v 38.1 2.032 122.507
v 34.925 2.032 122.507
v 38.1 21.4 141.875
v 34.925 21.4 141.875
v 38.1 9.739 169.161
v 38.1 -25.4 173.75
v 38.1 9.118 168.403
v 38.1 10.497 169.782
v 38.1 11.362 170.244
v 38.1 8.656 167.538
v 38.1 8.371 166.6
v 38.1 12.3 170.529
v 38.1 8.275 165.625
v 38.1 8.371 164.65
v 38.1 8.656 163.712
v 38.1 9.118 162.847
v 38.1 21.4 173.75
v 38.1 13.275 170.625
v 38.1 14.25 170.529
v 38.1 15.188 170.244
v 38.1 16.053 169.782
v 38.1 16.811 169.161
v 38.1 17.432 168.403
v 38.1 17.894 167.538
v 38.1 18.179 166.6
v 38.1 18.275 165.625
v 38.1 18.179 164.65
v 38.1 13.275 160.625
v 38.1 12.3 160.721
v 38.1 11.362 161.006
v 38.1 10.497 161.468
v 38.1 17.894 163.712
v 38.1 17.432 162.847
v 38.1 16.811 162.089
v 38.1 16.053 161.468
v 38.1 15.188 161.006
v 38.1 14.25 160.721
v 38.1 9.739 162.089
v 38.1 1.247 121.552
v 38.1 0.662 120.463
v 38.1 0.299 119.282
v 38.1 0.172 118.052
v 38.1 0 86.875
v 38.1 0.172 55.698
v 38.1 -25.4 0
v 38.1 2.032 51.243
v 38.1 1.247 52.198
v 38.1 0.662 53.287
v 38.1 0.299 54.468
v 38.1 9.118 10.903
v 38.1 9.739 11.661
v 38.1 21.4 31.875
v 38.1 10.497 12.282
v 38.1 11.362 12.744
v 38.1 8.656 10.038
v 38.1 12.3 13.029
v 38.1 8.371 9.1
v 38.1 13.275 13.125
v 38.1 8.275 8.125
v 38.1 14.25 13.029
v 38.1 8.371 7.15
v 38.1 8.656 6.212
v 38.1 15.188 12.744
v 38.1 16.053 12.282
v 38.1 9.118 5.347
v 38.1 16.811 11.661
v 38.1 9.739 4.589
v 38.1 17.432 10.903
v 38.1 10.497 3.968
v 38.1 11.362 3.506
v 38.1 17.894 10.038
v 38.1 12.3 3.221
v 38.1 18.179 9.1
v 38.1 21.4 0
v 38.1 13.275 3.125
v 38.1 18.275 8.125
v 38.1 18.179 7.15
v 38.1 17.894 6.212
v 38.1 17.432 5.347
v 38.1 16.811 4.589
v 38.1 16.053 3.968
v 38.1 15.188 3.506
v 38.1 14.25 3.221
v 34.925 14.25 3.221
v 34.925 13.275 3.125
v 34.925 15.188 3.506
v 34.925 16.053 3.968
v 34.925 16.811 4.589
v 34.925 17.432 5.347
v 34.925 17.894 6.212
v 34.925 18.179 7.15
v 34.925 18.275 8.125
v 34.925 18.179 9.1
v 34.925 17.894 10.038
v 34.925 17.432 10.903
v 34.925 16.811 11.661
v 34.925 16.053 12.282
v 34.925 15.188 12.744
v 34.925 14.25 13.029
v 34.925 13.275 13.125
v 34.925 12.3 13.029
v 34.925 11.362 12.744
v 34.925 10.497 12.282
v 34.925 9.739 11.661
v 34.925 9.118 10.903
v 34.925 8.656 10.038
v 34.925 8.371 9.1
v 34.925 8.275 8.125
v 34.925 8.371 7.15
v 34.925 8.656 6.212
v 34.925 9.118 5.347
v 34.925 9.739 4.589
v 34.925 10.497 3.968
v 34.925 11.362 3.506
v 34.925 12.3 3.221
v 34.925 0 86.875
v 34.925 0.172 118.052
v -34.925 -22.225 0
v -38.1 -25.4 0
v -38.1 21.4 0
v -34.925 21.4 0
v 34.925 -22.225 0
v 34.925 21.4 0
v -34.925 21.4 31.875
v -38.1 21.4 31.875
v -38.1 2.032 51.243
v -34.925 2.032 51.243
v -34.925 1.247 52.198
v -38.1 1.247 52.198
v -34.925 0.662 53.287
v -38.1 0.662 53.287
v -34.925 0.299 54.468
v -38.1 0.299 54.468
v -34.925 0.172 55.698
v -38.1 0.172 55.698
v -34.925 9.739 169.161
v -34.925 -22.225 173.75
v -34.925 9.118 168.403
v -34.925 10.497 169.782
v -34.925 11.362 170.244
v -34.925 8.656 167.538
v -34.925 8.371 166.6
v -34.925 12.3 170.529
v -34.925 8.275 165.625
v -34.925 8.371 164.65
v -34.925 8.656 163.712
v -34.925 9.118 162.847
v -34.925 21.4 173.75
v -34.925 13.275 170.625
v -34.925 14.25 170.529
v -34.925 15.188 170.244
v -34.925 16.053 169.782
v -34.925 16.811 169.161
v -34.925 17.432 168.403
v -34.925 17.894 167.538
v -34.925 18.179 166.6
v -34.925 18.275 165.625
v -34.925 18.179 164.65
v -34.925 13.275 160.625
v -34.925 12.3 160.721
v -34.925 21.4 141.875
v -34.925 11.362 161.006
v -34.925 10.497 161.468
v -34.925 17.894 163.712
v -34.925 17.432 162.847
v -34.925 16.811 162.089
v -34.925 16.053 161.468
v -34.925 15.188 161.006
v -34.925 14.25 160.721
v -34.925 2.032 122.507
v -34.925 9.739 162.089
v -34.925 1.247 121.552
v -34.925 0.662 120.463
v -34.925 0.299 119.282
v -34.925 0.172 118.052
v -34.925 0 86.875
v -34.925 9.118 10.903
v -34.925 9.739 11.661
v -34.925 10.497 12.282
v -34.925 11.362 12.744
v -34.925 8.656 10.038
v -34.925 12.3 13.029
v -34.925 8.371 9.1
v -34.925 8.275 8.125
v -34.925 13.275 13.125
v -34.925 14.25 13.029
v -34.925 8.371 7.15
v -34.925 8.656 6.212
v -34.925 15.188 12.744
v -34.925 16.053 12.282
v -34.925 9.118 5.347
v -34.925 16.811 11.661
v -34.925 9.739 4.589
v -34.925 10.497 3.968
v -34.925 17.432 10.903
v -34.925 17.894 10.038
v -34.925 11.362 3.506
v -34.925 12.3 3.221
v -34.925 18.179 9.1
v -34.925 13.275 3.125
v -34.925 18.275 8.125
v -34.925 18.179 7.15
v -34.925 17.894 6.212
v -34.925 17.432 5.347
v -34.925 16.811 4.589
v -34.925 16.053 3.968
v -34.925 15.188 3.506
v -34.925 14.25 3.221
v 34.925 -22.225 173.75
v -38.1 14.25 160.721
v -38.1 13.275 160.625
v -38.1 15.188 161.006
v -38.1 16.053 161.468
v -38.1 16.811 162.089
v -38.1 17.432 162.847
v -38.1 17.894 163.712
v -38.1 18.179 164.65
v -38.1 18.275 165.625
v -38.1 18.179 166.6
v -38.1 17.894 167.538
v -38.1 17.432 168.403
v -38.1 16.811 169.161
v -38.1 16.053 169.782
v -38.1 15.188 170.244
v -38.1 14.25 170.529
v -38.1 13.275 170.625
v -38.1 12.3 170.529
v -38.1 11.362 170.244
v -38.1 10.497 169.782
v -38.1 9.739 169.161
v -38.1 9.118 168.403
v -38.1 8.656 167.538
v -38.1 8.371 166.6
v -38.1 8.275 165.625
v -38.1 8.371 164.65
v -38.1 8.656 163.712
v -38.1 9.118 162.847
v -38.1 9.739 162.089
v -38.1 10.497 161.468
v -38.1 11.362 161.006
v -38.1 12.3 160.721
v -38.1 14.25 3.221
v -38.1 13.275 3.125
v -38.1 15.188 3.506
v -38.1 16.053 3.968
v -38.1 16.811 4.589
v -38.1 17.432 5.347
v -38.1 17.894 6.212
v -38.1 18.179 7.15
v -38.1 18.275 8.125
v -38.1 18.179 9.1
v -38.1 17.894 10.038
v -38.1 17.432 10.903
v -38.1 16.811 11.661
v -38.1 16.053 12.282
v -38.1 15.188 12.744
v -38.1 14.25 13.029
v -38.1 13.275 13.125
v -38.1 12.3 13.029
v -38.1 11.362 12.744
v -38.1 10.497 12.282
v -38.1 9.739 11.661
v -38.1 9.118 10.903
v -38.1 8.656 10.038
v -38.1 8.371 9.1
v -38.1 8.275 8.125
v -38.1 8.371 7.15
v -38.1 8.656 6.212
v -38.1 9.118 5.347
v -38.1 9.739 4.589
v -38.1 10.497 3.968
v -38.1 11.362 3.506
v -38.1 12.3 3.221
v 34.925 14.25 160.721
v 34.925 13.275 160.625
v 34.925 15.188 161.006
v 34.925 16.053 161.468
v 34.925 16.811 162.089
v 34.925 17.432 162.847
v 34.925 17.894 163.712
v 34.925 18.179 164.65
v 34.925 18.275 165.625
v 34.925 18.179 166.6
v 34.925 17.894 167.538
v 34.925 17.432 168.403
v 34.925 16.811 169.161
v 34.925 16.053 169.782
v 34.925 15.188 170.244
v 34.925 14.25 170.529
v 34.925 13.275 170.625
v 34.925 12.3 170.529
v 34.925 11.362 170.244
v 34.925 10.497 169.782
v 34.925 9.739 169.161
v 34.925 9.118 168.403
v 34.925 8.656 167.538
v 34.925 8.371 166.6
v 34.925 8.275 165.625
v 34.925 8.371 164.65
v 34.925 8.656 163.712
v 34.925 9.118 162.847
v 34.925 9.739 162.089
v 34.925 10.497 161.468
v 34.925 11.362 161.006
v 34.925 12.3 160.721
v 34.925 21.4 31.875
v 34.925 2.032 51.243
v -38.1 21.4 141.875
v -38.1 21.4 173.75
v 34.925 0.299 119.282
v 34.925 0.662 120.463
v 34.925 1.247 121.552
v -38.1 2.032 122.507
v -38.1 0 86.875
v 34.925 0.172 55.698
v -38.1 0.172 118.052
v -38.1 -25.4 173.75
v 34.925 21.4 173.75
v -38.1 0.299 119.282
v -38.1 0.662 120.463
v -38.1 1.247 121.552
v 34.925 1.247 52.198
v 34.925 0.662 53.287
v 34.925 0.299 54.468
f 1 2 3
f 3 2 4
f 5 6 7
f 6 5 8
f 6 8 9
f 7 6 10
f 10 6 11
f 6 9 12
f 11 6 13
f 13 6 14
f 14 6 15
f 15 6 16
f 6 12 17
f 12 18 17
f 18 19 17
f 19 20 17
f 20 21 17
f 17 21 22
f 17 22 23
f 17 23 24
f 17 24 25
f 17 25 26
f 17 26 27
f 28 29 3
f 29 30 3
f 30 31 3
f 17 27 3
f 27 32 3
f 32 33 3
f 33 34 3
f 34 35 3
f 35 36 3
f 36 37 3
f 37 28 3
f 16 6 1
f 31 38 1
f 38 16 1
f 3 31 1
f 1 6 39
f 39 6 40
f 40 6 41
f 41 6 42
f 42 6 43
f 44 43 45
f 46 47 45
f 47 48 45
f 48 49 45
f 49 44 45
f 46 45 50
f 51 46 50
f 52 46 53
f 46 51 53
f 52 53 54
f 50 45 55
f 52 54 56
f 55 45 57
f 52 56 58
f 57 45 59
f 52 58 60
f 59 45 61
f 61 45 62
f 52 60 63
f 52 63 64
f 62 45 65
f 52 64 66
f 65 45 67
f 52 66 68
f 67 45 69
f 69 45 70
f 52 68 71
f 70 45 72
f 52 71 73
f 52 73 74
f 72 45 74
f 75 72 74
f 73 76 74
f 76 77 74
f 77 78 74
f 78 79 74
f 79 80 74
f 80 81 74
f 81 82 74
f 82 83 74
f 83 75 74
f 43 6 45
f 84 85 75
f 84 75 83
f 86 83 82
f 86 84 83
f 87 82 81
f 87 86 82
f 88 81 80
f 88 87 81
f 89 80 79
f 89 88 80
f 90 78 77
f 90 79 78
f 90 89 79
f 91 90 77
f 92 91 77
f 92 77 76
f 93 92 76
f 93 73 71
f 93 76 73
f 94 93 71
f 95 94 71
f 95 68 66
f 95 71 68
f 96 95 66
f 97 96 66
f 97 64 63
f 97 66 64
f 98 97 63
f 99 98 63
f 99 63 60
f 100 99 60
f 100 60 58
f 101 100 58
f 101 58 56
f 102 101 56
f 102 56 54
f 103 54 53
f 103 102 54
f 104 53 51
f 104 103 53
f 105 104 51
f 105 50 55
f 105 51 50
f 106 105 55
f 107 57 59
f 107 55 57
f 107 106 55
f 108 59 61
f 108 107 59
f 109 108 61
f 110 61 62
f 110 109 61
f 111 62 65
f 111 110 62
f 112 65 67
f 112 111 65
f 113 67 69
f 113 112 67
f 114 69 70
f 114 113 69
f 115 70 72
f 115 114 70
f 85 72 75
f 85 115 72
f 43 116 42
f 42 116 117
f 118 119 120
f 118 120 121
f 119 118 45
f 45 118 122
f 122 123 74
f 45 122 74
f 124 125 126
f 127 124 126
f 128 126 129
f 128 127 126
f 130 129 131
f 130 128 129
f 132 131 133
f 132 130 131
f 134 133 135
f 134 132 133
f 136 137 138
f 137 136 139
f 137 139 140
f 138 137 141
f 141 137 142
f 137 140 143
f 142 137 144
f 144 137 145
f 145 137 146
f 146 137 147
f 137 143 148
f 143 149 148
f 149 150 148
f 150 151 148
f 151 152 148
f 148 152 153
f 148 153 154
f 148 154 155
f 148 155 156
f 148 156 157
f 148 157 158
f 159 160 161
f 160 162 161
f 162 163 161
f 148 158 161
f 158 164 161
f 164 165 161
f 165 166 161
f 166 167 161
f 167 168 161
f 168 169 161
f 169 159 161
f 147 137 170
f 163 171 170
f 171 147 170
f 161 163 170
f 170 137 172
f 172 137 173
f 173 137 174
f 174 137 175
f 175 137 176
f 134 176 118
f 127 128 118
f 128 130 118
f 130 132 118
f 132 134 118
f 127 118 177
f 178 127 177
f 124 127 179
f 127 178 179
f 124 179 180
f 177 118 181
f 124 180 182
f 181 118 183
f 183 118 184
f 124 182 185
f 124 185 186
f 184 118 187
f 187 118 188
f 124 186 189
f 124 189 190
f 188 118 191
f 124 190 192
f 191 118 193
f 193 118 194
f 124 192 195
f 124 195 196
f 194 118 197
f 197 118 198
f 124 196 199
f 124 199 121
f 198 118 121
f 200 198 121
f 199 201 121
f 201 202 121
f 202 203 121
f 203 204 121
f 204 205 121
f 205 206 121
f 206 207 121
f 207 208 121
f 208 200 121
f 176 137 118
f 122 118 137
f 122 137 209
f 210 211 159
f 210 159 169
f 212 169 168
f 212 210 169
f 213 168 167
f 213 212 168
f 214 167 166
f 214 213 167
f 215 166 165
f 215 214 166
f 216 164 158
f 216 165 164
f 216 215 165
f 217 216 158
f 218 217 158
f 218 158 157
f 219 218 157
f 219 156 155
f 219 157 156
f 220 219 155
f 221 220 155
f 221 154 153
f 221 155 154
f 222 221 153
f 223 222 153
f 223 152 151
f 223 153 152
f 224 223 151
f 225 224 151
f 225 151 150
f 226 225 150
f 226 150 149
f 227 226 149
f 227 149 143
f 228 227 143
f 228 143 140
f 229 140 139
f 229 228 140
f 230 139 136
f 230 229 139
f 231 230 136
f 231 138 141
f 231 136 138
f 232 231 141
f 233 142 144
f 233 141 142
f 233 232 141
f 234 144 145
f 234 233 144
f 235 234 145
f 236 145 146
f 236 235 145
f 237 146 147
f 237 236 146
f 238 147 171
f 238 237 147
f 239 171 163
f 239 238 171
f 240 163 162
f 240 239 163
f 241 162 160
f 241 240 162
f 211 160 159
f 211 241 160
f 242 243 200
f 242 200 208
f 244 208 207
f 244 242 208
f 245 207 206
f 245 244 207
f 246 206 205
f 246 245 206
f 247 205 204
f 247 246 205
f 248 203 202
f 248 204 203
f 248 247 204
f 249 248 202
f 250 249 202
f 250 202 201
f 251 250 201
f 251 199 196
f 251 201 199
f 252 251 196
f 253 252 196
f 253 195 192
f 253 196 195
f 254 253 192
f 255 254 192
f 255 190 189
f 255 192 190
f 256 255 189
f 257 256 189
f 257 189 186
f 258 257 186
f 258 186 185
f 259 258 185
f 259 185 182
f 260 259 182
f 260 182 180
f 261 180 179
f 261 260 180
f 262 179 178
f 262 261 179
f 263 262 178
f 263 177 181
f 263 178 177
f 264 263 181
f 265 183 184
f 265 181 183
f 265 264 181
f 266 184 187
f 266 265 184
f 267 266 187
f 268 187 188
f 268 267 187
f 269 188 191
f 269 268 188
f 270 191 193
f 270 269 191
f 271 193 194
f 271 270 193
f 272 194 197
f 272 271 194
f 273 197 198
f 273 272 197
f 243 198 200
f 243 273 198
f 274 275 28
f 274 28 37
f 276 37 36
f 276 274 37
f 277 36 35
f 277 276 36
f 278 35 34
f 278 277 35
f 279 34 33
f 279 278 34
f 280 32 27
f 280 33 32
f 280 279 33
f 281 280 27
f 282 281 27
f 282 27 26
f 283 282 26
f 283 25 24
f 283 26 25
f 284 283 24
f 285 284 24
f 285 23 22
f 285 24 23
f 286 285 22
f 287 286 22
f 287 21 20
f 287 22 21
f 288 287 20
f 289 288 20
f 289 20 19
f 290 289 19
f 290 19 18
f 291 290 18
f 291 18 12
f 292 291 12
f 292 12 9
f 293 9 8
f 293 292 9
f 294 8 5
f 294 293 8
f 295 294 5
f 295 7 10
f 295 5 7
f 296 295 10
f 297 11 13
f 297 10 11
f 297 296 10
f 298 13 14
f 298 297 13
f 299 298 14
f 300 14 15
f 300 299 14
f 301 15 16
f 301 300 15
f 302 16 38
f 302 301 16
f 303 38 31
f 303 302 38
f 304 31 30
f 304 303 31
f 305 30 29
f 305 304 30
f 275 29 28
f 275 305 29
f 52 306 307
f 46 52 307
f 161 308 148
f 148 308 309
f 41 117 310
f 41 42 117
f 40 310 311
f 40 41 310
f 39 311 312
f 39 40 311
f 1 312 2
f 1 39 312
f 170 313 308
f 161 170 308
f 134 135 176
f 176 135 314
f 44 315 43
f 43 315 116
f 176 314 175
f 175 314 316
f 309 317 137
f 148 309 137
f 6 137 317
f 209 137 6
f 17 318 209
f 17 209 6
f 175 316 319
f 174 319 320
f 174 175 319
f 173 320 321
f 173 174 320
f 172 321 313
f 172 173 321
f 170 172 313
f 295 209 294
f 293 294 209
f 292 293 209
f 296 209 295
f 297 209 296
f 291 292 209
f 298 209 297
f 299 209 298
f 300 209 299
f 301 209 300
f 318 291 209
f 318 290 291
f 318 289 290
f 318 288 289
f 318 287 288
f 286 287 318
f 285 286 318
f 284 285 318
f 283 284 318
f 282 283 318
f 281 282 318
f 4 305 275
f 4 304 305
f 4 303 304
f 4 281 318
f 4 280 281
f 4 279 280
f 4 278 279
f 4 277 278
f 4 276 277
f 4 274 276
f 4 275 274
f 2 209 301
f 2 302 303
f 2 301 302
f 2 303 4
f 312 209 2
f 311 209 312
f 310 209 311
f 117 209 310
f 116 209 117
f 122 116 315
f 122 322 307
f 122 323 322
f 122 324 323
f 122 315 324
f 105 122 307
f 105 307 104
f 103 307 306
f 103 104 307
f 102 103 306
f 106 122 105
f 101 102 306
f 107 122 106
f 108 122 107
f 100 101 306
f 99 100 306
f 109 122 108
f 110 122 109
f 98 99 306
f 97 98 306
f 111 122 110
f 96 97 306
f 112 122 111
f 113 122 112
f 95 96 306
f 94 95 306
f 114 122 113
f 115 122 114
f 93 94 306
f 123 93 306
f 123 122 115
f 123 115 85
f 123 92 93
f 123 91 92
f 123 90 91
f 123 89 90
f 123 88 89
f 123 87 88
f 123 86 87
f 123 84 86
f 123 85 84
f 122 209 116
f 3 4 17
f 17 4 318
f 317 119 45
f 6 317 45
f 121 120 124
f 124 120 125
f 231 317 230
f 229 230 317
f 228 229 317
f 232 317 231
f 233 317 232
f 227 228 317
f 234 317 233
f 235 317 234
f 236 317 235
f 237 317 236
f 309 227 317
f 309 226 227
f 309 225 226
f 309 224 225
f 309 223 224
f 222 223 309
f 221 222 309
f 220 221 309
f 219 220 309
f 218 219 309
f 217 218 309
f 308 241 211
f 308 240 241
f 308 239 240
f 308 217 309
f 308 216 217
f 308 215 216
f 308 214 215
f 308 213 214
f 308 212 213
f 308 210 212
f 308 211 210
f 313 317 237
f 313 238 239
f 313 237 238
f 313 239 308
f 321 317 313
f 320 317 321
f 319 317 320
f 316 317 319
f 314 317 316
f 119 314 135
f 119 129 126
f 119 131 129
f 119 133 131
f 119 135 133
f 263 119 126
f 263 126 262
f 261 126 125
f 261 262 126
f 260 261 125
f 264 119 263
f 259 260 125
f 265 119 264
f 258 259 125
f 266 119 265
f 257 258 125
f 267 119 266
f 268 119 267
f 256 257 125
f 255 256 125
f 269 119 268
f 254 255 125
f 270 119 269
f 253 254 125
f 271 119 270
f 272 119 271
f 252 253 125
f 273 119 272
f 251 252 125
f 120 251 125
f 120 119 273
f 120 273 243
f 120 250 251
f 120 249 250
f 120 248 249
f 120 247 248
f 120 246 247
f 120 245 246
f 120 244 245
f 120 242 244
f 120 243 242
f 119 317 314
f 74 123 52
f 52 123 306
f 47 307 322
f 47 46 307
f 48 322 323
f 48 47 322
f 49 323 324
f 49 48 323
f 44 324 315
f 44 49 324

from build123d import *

# Parameters (mm, degrees)
SKETCH1_W               = 76.2
SKETCH1_H               = 50.8
SKETCH1_W_2             = 69.85
SKETCH1_H_2             = 44.45
BOSS_EXTRUDE1_DEPTH     = 173.75
CUT_EXTRUDE1_DEPTH      = 180.682588194
CUT_EXTRUDE1_DEPTH_BACK = 180.682588194
SKETCH2_R               = 5
FILLET1_R               = 6.35


with BuildPart() as part:
    # Sketch1 → Boss-Extrude1 (new body)
    with BuildSketch(Plane.XY):
        Rectangle(SKETCH1_W, SKETCH1_H)
        Rectangle(SKETCH1_W_2, SKETCH1_H_2, mode=Mode.SUBTRACT)
    extrude(amount=BOSS_EXTRUDE1_DEPTH)

    # Sketch2 → Cut-Extrude1 (cut, two sides: drawn at the far end of the back side and taken through both)
    with BuildSketch(Plane(origin=(0, 0, 0), x_dir=(0, 0, -1), z_dir=(1, 0, 0)).offset(-CUT_EXTRUDE1_DEPTH_BACK)):
        with Locations((-165.625, 13.275)):
            Circle(SKETCH2_R)
        with Locations((-8.125, 13.275)):
            Circle(SKETCH2_R)
        Polygon((-173.75, 25.4), (0, 25.4), (0, 21.4), (-31.875, 21.4), (-53.088203436, 0.186796564), (-86.875, 0), (-120.661796564, 0.186796564), (-141.875, 21.4), (-173.75, 21.4), align=None)
    extrude(amount=CUT_EXTRUDE1_DEPTH + CUT_EXTRUDE1_DEPTH_BACK, mode=Mode.SUBTRACT)

    # Fillet1
    fillet1_edges = [part.edges().sort_by_distance(p)[0] for p in [
        (-36.5125, 0.186796564, 53.088203436),
        (-36.5125, 0.186796564, 120.661796564),
        (36.5125, 0.186796564, 53.088203436),
        (36.5125, 0.186796564, 120.661796564),
    ]]
    fillet(fillet1_edges, radius=FILLET1_R)


solid = part.part
